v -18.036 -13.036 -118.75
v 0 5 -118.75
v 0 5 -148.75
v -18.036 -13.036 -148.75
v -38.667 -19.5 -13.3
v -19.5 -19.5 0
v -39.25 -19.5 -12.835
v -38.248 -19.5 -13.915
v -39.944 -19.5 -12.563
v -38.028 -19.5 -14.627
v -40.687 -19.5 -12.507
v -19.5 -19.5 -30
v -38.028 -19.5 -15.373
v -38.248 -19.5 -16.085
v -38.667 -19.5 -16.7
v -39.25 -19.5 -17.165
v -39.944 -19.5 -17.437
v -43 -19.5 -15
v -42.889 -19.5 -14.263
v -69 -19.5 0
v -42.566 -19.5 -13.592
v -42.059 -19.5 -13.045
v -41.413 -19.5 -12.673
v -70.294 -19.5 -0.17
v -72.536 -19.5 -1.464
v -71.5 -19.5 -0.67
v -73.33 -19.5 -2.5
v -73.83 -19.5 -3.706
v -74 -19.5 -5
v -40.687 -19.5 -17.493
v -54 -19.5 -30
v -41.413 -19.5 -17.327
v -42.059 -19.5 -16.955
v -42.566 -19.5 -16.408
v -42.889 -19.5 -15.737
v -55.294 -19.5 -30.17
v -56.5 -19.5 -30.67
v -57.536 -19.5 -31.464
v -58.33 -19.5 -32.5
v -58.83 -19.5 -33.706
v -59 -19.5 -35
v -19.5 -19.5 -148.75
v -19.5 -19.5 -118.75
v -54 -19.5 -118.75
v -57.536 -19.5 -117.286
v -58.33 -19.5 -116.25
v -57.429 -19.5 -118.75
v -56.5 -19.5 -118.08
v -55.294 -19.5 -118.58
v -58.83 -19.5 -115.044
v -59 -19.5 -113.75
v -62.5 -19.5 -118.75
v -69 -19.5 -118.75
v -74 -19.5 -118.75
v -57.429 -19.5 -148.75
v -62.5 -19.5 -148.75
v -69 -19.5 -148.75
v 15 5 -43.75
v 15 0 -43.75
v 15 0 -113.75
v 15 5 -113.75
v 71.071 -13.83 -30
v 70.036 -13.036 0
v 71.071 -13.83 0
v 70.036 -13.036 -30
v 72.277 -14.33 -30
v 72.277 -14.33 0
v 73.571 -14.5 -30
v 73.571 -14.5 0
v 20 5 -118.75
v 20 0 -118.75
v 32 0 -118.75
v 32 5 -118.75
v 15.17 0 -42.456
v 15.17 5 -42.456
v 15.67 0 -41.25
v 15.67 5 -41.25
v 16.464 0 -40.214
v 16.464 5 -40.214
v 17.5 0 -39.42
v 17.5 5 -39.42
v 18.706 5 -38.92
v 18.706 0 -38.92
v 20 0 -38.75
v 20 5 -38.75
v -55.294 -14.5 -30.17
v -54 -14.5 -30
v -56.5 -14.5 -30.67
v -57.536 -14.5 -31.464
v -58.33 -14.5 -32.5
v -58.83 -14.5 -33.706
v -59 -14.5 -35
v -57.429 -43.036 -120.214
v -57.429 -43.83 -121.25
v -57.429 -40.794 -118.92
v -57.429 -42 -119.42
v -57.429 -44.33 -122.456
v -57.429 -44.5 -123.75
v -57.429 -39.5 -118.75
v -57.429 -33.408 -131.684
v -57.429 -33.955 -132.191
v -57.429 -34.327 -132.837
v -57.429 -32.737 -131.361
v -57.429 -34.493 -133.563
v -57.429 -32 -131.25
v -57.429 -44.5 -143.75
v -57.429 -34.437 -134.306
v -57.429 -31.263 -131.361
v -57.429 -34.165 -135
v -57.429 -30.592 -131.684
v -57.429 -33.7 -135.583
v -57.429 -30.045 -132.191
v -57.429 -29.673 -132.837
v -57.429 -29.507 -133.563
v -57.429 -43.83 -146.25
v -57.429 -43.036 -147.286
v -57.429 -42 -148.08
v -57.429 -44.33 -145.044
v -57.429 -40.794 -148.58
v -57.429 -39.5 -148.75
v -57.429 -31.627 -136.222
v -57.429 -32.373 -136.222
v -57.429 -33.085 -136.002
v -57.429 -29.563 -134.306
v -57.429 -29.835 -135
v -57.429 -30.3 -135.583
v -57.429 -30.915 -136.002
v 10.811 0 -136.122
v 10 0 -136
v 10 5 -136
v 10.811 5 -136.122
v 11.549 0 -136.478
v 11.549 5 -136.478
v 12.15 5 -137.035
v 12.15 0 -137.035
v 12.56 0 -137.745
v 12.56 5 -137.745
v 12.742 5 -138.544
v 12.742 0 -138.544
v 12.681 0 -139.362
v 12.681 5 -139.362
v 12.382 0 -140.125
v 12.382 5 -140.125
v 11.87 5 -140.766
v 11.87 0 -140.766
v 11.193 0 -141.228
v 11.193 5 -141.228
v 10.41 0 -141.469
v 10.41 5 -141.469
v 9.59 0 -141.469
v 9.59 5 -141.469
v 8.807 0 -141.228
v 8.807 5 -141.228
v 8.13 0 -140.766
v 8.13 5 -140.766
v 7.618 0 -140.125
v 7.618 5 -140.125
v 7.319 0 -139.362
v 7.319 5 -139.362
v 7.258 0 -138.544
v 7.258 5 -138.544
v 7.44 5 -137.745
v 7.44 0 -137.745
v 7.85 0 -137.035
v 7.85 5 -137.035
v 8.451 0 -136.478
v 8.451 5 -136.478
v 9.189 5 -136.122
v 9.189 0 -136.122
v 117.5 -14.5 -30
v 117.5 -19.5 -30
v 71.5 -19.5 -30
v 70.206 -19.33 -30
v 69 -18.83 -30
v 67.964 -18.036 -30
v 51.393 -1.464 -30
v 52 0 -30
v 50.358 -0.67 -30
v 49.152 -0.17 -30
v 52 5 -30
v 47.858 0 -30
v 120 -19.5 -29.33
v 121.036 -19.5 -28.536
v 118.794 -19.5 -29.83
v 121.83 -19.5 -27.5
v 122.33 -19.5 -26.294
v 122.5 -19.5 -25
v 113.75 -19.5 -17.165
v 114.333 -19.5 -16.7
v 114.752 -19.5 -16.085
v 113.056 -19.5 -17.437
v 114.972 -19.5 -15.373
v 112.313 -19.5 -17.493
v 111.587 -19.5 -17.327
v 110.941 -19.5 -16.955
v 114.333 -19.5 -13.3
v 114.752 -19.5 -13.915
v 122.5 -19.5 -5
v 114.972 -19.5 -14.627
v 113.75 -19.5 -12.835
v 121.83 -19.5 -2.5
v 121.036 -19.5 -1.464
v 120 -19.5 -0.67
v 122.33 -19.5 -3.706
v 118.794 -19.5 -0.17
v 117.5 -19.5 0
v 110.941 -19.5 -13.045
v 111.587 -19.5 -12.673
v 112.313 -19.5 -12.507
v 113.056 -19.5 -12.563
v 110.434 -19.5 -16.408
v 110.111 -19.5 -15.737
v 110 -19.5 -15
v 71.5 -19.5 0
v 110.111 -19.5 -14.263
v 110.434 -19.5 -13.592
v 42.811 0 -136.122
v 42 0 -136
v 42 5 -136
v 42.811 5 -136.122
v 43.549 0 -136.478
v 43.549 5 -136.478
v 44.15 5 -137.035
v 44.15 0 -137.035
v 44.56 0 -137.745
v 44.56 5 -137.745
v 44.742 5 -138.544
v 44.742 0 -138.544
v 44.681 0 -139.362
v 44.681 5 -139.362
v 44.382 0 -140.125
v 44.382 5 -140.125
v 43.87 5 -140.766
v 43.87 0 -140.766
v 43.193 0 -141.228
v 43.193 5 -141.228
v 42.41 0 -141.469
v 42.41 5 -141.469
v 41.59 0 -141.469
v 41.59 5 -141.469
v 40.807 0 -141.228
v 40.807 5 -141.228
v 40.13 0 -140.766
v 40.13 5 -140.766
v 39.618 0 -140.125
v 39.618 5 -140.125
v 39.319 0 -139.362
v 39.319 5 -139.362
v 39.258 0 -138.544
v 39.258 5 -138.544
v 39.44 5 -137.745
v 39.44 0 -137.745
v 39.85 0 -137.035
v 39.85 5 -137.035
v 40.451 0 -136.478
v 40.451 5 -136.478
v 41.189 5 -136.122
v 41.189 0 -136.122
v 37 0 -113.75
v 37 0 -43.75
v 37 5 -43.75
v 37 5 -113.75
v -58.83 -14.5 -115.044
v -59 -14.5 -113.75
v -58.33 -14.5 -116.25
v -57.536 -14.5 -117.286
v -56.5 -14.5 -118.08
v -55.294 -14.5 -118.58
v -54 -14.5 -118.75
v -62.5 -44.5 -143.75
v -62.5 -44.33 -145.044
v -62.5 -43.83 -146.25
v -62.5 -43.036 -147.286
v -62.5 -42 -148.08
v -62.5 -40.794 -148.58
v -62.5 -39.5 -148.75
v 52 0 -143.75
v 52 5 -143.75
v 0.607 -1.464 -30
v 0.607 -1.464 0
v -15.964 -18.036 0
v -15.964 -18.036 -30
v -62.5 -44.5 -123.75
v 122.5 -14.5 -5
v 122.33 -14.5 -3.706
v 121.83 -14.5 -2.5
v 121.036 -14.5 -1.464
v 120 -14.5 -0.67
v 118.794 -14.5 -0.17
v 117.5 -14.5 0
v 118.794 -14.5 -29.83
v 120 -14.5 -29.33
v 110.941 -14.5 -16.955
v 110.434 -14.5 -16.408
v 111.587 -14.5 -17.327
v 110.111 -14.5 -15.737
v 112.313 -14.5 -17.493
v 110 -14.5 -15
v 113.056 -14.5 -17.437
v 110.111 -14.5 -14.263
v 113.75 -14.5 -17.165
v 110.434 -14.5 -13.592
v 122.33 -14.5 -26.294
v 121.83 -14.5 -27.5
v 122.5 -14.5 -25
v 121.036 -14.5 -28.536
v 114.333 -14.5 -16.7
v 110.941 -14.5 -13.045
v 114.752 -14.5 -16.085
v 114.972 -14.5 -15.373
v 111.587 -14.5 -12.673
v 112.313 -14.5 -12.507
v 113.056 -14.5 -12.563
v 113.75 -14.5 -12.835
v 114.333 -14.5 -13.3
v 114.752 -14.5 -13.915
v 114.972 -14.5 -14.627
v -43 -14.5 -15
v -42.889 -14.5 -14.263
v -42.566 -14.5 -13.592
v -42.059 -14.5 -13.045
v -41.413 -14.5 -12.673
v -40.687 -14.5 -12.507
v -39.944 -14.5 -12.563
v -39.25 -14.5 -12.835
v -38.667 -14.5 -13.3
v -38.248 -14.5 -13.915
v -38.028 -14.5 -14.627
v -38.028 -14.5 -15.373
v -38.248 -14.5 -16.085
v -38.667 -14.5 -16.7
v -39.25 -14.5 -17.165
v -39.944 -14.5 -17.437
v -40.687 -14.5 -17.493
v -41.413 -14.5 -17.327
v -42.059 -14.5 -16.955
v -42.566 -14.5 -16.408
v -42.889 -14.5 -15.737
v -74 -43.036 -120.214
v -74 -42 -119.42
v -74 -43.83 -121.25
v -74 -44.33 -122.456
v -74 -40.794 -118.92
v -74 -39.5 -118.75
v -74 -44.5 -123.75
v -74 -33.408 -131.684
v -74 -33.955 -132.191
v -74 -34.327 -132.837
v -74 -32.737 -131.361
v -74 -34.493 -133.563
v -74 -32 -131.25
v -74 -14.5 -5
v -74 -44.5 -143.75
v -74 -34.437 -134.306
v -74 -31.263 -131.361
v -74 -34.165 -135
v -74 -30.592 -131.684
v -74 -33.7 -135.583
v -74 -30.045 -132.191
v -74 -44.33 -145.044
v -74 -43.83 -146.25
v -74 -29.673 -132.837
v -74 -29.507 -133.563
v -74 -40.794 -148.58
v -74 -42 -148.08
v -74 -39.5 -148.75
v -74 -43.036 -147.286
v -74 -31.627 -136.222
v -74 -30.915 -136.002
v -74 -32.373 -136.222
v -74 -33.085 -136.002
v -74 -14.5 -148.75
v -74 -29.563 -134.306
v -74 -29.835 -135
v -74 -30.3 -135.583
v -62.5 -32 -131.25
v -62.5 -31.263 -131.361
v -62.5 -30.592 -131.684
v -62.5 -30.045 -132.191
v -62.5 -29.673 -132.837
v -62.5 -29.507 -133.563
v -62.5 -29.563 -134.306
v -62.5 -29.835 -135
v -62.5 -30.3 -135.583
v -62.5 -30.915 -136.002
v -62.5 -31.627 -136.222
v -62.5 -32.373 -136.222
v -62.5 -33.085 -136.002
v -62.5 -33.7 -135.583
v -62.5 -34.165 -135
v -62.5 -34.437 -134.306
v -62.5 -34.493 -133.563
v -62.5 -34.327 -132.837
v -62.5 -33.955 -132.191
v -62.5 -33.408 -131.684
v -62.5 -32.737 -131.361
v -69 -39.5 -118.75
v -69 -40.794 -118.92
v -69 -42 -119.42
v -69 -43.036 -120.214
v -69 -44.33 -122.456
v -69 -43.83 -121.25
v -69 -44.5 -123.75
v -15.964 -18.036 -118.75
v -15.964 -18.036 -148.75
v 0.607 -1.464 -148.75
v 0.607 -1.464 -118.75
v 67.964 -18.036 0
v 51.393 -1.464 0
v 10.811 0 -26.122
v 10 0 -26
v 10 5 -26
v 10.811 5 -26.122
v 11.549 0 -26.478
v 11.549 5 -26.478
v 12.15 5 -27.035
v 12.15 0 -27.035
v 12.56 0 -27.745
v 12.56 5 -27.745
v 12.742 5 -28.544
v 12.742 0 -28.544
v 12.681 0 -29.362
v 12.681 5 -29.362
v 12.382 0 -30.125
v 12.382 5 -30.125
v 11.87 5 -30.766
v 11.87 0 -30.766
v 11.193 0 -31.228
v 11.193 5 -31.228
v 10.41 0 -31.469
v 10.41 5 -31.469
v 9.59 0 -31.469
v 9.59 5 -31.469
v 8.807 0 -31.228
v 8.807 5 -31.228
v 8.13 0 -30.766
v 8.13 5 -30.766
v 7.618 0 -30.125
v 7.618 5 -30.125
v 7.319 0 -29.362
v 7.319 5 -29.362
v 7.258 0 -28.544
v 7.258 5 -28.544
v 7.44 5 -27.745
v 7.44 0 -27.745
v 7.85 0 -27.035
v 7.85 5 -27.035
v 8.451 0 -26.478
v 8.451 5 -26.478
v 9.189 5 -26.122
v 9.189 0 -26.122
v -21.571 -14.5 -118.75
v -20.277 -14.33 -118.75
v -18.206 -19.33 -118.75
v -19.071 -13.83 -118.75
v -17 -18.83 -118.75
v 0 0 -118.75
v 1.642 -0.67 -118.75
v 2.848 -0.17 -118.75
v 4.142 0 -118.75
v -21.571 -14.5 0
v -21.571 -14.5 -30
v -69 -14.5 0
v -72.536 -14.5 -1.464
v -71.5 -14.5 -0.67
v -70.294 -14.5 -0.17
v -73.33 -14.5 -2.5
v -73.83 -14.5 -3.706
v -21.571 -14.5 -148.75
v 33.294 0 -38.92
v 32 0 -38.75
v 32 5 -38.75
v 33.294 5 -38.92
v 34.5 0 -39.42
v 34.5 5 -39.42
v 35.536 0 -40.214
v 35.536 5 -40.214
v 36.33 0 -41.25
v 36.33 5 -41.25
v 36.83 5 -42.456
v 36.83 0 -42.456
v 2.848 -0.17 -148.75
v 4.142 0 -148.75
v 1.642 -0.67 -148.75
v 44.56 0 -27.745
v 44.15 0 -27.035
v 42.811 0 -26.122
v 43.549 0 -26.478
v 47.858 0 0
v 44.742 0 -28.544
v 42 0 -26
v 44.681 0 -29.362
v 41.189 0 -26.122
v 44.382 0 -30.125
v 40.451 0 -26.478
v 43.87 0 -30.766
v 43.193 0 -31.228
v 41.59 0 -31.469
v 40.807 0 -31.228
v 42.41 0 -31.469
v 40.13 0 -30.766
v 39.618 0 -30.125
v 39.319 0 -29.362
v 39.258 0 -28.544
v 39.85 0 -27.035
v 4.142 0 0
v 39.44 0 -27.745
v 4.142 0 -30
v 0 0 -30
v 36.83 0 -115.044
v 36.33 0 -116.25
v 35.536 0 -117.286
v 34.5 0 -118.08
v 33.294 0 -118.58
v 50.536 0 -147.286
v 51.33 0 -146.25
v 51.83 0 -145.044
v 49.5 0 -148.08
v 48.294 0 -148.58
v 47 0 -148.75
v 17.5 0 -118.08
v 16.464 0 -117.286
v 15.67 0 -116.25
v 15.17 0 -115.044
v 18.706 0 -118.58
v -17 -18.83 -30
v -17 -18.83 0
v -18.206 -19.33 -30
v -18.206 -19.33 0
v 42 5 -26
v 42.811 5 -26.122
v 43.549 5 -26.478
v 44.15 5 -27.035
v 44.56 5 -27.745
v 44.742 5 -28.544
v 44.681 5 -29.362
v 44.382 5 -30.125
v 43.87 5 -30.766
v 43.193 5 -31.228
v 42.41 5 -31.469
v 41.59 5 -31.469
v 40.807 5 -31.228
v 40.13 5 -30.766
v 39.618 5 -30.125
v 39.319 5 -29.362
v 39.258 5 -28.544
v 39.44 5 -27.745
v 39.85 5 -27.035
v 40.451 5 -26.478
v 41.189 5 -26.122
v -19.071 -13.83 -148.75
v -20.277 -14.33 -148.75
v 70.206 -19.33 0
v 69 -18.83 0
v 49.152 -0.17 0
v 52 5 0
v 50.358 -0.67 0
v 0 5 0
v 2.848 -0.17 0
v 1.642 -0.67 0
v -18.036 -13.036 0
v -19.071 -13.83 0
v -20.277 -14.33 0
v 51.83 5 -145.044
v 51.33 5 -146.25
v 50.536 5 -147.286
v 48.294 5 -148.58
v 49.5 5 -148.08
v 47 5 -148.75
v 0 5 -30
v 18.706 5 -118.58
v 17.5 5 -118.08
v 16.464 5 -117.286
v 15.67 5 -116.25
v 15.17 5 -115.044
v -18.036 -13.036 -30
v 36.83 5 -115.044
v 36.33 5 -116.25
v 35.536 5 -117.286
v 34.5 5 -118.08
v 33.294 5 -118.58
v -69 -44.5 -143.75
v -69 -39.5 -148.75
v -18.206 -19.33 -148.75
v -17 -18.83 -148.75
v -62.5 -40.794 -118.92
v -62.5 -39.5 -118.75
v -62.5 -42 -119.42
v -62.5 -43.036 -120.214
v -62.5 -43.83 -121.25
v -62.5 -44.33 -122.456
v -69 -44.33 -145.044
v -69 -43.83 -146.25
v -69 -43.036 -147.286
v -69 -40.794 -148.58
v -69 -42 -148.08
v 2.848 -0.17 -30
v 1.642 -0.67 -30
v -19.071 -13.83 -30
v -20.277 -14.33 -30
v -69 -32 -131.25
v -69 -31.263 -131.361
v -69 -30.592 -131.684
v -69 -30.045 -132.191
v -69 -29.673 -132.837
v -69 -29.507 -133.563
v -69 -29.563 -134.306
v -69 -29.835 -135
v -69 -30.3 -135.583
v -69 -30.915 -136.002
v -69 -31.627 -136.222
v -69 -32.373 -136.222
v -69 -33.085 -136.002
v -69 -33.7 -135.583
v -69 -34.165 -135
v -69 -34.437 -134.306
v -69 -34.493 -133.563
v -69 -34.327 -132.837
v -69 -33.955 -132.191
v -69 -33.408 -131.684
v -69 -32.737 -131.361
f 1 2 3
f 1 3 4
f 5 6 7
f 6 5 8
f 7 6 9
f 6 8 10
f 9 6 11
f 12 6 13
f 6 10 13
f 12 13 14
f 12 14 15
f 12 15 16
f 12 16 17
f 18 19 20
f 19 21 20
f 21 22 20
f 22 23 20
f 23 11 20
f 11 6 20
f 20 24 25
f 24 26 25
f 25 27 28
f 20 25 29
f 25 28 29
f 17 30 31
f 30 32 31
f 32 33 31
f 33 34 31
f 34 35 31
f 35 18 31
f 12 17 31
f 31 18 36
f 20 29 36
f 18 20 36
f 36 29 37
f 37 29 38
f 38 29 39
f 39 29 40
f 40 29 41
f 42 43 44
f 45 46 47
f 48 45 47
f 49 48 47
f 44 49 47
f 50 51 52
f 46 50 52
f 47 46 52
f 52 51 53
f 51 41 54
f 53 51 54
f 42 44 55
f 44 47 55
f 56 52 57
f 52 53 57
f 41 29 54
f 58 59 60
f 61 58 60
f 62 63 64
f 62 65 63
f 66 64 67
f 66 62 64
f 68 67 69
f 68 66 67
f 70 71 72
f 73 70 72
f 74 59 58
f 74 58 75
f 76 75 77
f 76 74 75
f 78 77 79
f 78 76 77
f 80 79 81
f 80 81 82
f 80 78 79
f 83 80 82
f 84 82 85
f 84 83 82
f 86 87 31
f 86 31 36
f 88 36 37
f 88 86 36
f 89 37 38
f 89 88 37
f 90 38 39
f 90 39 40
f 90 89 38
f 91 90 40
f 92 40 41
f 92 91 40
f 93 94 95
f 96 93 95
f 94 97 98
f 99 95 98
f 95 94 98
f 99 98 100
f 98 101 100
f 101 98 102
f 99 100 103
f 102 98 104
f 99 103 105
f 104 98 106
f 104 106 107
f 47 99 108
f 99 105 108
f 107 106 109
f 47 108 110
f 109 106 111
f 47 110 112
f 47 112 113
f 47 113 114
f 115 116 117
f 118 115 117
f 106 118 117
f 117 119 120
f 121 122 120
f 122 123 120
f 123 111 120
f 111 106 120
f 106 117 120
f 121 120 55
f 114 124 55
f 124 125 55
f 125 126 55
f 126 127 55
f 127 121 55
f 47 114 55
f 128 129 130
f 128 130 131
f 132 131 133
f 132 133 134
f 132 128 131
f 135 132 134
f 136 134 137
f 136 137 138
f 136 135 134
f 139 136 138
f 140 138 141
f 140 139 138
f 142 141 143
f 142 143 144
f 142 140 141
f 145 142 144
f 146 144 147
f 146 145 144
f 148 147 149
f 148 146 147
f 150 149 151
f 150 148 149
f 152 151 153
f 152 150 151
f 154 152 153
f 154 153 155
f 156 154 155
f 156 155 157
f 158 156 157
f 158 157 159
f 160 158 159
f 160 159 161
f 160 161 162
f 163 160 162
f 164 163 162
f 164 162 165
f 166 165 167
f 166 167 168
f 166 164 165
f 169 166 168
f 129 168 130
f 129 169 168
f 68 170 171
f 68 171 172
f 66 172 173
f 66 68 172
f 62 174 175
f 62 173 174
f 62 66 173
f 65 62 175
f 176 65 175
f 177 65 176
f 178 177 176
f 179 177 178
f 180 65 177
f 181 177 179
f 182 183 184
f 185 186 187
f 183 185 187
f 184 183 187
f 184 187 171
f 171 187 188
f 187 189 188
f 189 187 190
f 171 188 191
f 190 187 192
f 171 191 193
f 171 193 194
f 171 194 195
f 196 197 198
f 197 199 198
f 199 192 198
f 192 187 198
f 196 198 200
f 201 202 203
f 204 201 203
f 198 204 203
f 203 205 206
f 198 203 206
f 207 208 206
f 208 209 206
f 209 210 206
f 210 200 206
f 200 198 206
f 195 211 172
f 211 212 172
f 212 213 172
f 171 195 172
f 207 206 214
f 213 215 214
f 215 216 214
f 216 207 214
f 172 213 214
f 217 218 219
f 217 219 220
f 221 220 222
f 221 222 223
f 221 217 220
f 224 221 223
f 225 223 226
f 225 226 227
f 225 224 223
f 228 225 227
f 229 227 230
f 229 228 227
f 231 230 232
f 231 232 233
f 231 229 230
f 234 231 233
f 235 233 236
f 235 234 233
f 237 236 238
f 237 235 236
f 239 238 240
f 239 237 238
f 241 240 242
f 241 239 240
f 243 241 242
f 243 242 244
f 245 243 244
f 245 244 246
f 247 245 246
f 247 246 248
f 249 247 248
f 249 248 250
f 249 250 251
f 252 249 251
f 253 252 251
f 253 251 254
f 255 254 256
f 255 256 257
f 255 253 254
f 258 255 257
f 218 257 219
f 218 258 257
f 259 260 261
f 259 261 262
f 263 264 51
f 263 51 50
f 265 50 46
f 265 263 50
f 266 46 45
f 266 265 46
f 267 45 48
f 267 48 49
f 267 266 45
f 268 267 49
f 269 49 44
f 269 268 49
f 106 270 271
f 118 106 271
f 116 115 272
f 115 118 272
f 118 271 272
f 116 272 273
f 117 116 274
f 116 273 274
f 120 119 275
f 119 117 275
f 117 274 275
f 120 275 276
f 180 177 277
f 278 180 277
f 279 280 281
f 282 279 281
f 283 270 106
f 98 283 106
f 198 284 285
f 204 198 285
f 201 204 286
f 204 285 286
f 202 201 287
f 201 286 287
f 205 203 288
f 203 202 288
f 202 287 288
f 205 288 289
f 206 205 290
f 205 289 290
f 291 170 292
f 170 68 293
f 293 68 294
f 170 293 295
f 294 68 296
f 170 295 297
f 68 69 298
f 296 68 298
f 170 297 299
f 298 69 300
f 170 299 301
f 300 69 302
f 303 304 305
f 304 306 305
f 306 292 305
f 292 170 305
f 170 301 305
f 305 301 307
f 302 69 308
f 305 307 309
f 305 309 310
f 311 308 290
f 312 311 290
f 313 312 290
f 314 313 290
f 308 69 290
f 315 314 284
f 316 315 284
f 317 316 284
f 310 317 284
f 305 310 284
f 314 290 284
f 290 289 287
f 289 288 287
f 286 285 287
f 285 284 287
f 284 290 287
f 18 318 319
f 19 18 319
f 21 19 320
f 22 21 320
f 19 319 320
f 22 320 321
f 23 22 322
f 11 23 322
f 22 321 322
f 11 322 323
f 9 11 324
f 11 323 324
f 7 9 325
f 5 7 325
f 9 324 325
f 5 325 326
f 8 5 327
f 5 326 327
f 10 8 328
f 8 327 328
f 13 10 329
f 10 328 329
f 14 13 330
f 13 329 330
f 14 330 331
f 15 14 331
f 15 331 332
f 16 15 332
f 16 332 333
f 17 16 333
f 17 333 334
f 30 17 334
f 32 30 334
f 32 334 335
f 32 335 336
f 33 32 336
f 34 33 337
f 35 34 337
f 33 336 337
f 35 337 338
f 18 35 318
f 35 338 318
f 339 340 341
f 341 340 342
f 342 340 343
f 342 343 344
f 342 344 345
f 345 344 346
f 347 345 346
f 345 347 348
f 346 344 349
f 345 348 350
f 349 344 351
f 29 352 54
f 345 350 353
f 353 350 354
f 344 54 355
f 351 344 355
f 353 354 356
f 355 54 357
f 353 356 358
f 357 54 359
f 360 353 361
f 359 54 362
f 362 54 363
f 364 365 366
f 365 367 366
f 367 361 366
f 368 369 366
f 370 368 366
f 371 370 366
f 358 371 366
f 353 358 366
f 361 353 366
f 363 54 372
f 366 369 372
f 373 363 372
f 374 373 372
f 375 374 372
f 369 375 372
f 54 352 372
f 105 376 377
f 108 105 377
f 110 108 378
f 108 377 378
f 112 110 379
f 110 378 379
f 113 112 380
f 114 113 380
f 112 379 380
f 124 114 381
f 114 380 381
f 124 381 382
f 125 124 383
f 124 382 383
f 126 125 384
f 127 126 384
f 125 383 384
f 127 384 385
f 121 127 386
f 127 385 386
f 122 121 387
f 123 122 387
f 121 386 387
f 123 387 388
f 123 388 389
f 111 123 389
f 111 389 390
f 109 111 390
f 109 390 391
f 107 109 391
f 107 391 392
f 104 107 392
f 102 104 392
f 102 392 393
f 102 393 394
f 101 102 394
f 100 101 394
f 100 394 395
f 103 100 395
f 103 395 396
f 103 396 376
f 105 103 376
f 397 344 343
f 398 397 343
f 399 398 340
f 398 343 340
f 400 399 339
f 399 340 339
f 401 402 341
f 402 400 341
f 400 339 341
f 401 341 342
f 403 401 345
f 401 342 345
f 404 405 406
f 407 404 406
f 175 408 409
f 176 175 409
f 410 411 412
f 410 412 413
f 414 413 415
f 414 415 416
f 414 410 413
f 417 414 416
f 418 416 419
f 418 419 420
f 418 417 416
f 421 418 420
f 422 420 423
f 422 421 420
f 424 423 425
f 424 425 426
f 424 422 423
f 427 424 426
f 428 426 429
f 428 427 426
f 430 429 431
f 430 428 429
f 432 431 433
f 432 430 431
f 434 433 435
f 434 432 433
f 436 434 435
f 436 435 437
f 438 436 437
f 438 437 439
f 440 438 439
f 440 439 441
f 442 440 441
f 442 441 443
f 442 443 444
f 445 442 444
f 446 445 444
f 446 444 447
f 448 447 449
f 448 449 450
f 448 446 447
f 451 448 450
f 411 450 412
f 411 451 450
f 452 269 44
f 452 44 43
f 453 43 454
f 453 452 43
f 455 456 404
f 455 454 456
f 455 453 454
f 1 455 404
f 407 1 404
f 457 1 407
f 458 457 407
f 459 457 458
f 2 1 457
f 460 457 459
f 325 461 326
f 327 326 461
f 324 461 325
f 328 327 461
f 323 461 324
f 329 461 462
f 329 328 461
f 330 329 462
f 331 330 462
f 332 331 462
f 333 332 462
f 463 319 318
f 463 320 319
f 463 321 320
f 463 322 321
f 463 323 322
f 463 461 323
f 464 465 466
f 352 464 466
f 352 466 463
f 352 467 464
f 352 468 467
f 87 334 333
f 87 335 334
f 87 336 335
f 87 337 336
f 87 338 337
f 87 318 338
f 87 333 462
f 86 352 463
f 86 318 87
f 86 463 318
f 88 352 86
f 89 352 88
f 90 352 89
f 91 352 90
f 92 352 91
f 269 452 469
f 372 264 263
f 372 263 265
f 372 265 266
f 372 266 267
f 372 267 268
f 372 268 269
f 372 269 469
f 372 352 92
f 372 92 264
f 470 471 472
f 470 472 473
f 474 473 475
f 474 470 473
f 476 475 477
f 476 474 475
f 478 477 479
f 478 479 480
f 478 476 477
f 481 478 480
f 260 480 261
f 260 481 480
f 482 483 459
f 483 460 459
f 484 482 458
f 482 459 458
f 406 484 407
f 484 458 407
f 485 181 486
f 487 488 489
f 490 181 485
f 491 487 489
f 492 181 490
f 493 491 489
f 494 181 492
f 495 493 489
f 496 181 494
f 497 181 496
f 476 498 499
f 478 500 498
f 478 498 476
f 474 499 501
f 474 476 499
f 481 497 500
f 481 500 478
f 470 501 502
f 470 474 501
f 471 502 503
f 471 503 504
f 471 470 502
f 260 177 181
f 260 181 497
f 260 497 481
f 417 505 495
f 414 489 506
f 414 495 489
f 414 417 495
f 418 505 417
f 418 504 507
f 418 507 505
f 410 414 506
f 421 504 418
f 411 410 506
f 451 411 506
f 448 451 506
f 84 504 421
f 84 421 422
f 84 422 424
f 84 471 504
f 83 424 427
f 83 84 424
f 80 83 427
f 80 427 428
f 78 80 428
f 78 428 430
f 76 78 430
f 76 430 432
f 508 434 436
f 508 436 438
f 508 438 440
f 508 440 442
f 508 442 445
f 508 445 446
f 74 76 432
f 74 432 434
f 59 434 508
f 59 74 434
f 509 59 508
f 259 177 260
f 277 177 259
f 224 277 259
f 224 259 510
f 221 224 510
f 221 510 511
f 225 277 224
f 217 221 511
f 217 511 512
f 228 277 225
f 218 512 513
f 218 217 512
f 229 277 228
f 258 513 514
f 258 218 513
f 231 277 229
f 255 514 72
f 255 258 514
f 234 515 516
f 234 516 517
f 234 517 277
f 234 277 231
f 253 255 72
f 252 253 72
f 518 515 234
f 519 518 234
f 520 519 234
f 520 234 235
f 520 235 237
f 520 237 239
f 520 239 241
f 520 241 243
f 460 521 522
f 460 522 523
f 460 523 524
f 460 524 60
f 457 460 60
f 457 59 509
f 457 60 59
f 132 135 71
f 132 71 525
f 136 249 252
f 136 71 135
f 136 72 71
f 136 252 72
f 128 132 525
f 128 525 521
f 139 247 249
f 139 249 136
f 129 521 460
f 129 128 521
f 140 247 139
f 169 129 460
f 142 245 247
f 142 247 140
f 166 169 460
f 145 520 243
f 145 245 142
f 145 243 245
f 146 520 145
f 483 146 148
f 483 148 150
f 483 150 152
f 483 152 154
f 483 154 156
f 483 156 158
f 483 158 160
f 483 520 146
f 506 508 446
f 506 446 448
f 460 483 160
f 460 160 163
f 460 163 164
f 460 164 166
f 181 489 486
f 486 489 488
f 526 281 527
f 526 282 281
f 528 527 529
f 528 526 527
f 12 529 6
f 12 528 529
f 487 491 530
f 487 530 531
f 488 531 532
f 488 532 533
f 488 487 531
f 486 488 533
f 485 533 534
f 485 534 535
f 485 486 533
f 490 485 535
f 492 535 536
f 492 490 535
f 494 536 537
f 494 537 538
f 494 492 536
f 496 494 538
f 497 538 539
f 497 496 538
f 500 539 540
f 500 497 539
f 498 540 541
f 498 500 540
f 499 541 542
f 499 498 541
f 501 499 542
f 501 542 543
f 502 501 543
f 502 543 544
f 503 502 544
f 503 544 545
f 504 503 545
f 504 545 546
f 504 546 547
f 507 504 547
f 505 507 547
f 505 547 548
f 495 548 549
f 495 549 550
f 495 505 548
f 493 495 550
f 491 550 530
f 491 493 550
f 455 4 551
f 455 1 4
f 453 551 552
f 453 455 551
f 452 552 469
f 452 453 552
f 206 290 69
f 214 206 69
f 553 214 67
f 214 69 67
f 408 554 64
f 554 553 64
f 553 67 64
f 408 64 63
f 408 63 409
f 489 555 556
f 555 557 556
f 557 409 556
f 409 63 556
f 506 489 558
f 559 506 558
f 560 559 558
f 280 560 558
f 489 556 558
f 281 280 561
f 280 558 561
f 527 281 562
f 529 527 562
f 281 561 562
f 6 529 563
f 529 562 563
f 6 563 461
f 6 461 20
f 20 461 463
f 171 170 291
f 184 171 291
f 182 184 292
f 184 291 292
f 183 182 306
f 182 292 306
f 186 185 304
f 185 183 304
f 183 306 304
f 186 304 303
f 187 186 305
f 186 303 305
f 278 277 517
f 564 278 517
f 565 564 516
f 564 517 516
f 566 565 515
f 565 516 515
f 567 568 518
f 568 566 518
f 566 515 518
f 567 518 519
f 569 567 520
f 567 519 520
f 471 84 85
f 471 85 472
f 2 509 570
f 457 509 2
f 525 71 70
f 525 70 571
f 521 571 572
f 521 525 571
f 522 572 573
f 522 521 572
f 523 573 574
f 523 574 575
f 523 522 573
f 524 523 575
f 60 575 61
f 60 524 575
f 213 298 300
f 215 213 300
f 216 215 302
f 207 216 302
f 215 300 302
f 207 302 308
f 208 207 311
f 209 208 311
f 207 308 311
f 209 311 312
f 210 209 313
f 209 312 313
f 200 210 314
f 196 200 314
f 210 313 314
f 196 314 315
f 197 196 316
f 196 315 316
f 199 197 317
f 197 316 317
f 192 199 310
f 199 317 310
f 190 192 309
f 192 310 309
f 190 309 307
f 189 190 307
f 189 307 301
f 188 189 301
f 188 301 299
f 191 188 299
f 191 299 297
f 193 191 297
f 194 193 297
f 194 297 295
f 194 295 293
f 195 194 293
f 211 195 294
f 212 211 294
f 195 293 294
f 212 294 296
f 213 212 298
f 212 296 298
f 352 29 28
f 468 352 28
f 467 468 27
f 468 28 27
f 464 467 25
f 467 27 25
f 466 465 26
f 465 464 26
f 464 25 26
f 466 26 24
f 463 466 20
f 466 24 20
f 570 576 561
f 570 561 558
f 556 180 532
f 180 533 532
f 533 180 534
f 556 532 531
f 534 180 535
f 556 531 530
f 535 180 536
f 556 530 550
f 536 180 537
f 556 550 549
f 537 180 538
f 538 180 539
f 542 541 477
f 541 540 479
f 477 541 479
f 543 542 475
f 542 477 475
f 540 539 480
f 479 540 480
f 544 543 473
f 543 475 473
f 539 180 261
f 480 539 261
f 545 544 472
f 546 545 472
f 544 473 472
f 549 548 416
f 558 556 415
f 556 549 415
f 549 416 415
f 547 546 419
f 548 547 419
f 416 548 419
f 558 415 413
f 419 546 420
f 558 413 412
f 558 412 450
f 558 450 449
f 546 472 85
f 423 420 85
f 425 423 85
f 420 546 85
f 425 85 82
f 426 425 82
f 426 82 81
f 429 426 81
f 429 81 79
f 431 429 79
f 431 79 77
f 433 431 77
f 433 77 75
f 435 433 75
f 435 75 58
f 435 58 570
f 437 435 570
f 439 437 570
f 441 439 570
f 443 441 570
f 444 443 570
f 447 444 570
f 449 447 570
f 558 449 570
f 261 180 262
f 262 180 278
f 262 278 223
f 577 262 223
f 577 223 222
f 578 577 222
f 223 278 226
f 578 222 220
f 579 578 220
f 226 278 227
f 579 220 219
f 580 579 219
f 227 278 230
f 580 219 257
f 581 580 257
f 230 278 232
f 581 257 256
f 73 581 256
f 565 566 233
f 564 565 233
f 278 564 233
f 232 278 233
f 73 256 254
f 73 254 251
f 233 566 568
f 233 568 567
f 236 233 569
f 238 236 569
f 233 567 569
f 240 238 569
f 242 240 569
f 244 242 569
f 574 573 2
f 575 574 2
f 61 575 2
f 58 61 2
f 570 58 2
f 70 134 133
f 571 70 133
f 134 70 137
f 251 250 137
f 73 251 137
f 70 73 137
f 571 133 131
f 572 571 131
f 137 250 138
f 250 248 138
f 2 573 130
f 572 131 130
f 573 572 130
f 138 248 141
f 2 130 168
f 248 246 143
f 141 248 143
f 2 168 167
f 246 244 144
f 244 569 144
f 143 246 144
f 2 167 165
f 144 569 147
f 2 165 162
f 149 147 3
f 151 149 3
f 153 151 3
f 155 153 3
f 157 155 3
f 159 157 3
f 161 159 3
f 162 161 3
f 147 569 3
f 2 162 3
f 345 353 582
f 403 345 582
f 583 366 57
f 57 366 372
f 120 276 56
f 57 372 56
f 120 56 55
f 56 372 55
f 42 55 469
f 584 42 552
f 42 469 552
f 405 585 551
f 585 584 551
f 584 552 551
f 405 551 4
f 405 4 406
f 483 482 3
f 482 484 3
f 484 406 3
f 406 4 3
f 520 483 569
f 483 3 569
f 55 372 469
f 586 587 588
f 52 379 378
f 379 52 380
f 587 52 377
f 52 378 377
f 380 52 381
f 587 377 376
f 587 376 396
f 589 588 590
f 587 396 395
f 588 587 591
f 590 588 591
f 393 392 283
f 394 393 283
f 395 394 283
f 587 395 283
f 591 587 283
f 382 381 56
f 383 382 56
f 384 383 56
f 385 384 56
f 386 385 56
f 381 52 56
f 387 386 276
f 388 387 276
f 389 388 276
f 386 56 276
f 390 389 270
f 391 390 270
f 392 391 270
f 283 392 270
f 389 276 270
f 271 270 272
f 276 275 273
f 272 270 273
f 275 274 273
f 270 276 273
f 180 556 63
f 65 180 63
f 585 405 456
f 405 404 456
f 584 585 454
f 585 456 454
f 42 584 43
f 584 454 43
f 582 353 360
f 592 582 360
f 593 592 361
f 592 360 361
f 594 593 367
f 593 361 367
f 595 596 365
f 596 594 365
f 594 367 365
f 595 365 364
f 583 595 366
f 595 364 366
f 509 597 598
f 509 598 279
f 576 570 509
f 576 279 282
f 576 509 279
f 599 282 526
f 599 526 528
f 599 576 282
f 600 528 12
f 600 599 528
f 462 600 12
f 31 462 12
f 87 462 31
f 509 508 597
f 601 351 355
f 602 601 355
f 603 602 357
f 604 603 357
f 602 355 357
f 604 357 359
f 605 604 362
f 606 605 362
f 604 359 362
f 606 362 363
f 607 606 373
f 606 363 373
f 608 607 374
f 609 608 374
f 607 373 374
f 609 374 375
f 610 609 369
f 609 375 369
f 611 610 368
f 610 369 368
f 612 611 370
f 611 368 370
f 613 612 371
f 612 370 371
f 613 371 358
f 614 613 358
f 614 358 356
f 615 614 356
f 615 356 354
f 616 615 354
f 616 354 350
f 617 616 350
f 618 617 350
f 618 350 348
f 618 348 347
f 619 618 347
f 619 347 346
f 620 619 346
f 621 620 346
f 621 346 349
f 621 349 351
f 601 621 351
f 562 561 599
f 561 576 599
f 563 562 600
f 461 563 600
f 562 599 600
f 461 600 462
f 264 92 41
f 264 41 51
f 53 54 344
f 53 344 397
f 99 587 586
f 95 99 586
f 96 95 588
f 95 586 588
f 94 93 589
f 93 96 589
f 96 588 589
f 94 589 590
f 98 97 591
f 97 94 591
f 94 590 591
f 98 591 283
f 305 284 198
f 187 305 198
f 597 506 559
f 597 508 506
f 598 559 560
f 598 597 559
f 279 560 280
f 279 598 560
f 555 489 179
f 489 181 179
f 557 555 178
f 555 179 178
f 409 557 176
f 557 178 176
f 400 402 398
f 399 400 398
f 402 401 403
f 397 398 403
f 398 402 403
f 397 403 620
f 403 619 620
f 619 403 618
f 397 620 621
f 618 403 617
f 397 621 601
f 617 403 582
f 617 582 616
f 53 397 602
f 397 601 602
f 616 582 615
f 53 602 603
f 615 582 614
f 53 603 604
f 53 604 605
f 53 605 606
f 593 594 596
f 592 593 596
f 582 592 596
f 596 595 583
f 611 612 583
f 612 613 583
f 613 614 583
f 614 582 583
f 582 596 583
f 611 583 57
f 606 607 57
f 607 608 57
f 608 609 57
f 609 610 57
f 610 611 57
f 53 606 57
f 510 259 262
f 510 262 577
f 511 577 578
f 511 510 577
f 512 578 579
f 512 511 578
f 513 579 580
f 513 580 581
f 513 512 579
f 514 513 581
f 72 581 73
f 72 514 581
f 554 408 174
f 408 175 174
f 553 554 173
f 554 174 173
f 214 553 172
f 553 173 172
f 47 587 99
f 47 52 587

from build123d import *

# Parameters (mm, degrees)
SKETCH1_W           = 52
SKETCH1_H           = 148.75
SKETCH1_R           = 2.75
SKETCH1_W_2         = 22
SKETCH1_H_2         = 80
BOSS_EXTRUDE2_DEPTH = 5
BOSS_EXTRUDE3_DEPTH = 30
BOSS_EXTRUDE5_DEPTH = 30
SKETCH3_R           = 2.5
CUT_EXTRUDE1_DEPTH  = 5
CUT_EXTRUDE2_REACH  = 252.438
SKETCH5_R           = 2.5
SKETCH6_W           = 15
SKETCH6_H           = 88.75
BOSS_EXTRUDE6_DEPTH = 5
FILLET1_R           = 5
FILLET2_R           = 5


with BuildPart() as part:
    # Sketch1 → Boss-Extrude2 (new body)
    with BuildSketch(Plane(origin=(0, 0, 0), x_dir=(1, 0, 0), z_dir=(0, 1, 0))):
        with Locations((26, 74.375)):
            Rectangle(SKETCH1_W, SKETCH1_H)
        with Locations(Location((10, 28.75, 0), (0, 0, 270))):
            Circle(SKETCH1_R, mode=Mode.SUBTRACT)
        with Locations(Location((42, 28.75, 0), (0, 0, 270))):
            Circle(SKETCH1_R, mode=Mode.SUBTRACT)
        with Locations(Location((10, 138.75, 0), (0, 0, 270))):
            Circle(SKETCH1_R, mode=Mode.SUBTRACT)
        with Locations(Location((42, 138.75, 0), (0, 0, 270))):
            Circle(SKETCH1_R, mode=Mode.SUBTRACT)
        with Locations((26, 78.75)):
            Rectangle(SKETCH1_W_2, SKETCH1_H_2, mode=Mode.SUBTRACT)
    extrude(amount=BOSS_EXTRUDE2_DEPTH)

    # Sketch2 → Boss-Extrude3 (add)
    with BuildSketch(Plane.XY):
        Polygon((0, 5), (0, 0), (2.071067812, 0), (-17.428932188, -19.5), (-74, -19.5), (-74, -14.5), (-19.5, -14.5), align=None)
        Polygon((71.5, -14.5), (122.5, -14.5), (122.5, -19.5), (69.428932188, -19.5), (49.928932188, 0), (52, 0), (52, 5), align=None)
    extrude(amount=-BOSS_EXTRUDE3_DEPTH)

    # Sketch4 → Boss-Extrude5 (add)
    with BuildSketch(Plane(origin=(0, 0, -148.75), x_dir=(-1, 0, 0), z_dir=(0, 0, -1))):
        Polygon((74, -14.5), (74, -44.5), (69, -44.5), (69, -19.5), (62.5, -19.5), (62.5, -44.5), (57.428932188, -44.5), (57.428932188, -19.5), (17.428932188, -19.5), (-2.071067812, 0), (0, 0), (0, 5), (19.5, -14.5), align=None)
    extrude(amount=-BOSS_EXTRUDE5_DEPTH)

    # Sketch3 → Cut-Extrude1 (cut)
    with BuildSketch(Plane(origin=(0, -14.5, 0), x_dir=(1, 0, 0), z_dir=(0, 1, 0))):
        with Locations(Location((-40.5, 15, 0), (0, 0, 180))):
            Circle(SKETCH3_R)
        with Locations(Location((112.5, 15, 0), (0, 0, 180))):
            Circle(SKETCH3_R)
    extrude(amount=-CUT_EXTRUDE1_DEPTH, mode=Mode.SUBTRACT)

    # Cut-Extrude2: up to this face of the body (flat: up to its plane)
    cut_extrude2_end = Plane(part.part.faces().sort_by_distance((-57.428932188, -32, -133.75))[0])
    # Sketch5 → Cut-Extrude2 (cut, up to the picked face)
    with BuildSketch(Plane.ZY.offset(74), mode=Mode.PRIVATE) as cut_extrude2_sk1:
        with Locations((-133.75, -32)):
            Circle(SKETCH5_R)
    cut_extrude2_tool1 = split(extrude(cut_extrude2_sk1.sketch, amount=-CUT_EXTRUDE2_REACH, mode=Mode.PRIVATE), bisect_by=cut_extrude2_end, keep=Keep.BOTH, mode=Mode.PRIVATE)
    add(cut_extrude2_tool1.solids().sort_by(Axis((-74, -32, -133.75), (1, 0, 0)))[0], mode=Mode.SUBTRACT)

    # Sketch6 → Boss-Extrude6 (add)
    with BuildSketch(Plane(origin=(0, -14.5, 0), x_dir=(1, 0, 0), z_dir=(0, 1, 0))):
        with Locations((-66.5, 74.375)):
            Rectangle(SKETCH6_W, SKETCH6_H)
    extrude(amount=-BOSS_EXTRUDE6_DEPTH)

    # Fillet1
    # the kernel refuses this fillet: 5 mm, written as the material it adds along each edge
    with BuildSketch(Plane(origin=(-59, -14.5, -118.75), x_dir=(0, 0, 1), z_dir=(0, -1, 0)), Plane(origin=(-59, -14.5, -30), x_dir=(1, 0, 0), z_dir=(0, -1, 0)), Plane(origin=(15, 0, -118.75), x_dir=(1, 0, 0), z_dir=(0, 1, 0))) as fillet1_piece_1:
        with BuildLine():
            CenterArc((FILLET1_R, -FILLET1_R), FILLET1_R, 90, 90)
            Line((0, -FILLET1_R), (0, 0))
            Line((0, 0), (FILLET1_R, 0))
        make_face()
    extrude(amount=5)
    with BuildSketch(Plane(origin=(15, 0, -38.75), x_dir=(1, 0, 0), z_dir=(0, 1, 0)), Plane(origin=(37, 0, -38.75), x_dir=(0, 0, -1), z_dir=(0, 1, 0)), Plane(origin=(37, 0, -118.75), x_dir=(-1, 0, 0), z_dir=(0, 1, 0))) as fillet1_piece_2:
        with BuildLine():
            CenterArc((FILLET1_R, FILLET1_R), FILLET1_R, 180, 90)
            Line((0, FILLET1_R), (0, 0))
            Line((0, 0), (FILLET1_R, 0))
        make_face()
    extrude(amount=5)
    # the kernel refuses this fillet: 5 mm, written as the material it takes off along each edge
    with BuildSketch(Plane(origin=(-74, -32, 0), x_dir=(1, 0, 0), z_dir=(0, 1, 0)), Plane(origin=(122.5, -2, 0), x_dir=(-1, 0, 0), z_dir=(0, -1, 0)), Plane(origin=(52, -12.5, -148.75), x_dir=(-1, 0, 0), z_dir=(0, 1, 0)), Plane(origin=(-86.5, -44.5, -148.75), x_dir=(0, 1, 0), z_dir=(1, 0, 0))) as fillet1_2_piece_1:
        with BuildLine():
            CenterArc((FILLET1_R, FILLET1_R), FILLET1_R, 180, 90)
            Line((0, FILLET1_R), (0, 0))
            Line((0, 0), (FILLET1_R, 0))
        make_face()
    extrude(amount=30, mode=Mode.SUBTRACT)
    with BuildSketch(Plane(origin=(122.5, -2, -30), x_dir=(-1, 0, 0), z_dir=(0, -1, 0)), Plane(origin=(-86.5, -44.5, -118.75), x_dir=(0, 1, 0), z_dir=(1, 0, 0))) as fillet1_2_piece_2:
        with BuildLine():
            CenterArc((FILLET1_R, -FILLET1_R), FILLET1_R, 90, 90)
            Line((0, -FILLET1_R), (0, 0))
            Line((0, 0), (FILLET1_R, 0))
        make_face()
    extrude(amount=30, mode=Mode.SUBTRACT)
    with BuildSketch(Plane(origin=(-75, -44.5, -118.75), x_dir=(0, 1, 0), z_dir=(1, 0, 0))) as fillet1_2_piece_3:
        with BuildLine():
            CenterArc((FILLET1_R, -FILLET1_R), FILLET1_R, 90, 90)
            Line((0, -FILLET1_R), (0, 0))
            Line((0, 0), (FILLET1_R, 0))
        make_face()
    extrude(amount=30.071067812, mode=Mode.SUBTRACT)
    with BuildSketch(Plane(origin=(-75, -44.5, -148.75), x_dir=(0, 1, 0), z_dir=(1, 0, 0))) as fillet1_2_piece_4:
        with BuildLine():
            CenterArc((FILLET1_R, FILLET1_R), FILLET1_R, 180, 90)
            Line((0, FILLET1_R), (0, 0))
            Line((0, 0), (FILLET1_R, 0))
        make_face()
    extrude(amount=30.071067812, mode=Mode.SUBTRACT)

    # Fillet2
    fillet2_edges = [part.edges().sort_by_distance(p)[0] for p in [
        (-19.5, -14.5, -15),
        (2.071067812, 0, -15),
        (-17.428932188, -19.5, -15),
        (49.928932188, 0, -15),
        (71.5, -14.5, -15),
        (69.428932188, -19.5, -15),
        (-19.5, -14.5, -133.75),
        (-17.428932188, -19.5, -133.75),
        (2.071067812, 0, -133.75),
    ]]
    fillet(fillet2_edges, radius=FILLET2_R)


solid = part.part
